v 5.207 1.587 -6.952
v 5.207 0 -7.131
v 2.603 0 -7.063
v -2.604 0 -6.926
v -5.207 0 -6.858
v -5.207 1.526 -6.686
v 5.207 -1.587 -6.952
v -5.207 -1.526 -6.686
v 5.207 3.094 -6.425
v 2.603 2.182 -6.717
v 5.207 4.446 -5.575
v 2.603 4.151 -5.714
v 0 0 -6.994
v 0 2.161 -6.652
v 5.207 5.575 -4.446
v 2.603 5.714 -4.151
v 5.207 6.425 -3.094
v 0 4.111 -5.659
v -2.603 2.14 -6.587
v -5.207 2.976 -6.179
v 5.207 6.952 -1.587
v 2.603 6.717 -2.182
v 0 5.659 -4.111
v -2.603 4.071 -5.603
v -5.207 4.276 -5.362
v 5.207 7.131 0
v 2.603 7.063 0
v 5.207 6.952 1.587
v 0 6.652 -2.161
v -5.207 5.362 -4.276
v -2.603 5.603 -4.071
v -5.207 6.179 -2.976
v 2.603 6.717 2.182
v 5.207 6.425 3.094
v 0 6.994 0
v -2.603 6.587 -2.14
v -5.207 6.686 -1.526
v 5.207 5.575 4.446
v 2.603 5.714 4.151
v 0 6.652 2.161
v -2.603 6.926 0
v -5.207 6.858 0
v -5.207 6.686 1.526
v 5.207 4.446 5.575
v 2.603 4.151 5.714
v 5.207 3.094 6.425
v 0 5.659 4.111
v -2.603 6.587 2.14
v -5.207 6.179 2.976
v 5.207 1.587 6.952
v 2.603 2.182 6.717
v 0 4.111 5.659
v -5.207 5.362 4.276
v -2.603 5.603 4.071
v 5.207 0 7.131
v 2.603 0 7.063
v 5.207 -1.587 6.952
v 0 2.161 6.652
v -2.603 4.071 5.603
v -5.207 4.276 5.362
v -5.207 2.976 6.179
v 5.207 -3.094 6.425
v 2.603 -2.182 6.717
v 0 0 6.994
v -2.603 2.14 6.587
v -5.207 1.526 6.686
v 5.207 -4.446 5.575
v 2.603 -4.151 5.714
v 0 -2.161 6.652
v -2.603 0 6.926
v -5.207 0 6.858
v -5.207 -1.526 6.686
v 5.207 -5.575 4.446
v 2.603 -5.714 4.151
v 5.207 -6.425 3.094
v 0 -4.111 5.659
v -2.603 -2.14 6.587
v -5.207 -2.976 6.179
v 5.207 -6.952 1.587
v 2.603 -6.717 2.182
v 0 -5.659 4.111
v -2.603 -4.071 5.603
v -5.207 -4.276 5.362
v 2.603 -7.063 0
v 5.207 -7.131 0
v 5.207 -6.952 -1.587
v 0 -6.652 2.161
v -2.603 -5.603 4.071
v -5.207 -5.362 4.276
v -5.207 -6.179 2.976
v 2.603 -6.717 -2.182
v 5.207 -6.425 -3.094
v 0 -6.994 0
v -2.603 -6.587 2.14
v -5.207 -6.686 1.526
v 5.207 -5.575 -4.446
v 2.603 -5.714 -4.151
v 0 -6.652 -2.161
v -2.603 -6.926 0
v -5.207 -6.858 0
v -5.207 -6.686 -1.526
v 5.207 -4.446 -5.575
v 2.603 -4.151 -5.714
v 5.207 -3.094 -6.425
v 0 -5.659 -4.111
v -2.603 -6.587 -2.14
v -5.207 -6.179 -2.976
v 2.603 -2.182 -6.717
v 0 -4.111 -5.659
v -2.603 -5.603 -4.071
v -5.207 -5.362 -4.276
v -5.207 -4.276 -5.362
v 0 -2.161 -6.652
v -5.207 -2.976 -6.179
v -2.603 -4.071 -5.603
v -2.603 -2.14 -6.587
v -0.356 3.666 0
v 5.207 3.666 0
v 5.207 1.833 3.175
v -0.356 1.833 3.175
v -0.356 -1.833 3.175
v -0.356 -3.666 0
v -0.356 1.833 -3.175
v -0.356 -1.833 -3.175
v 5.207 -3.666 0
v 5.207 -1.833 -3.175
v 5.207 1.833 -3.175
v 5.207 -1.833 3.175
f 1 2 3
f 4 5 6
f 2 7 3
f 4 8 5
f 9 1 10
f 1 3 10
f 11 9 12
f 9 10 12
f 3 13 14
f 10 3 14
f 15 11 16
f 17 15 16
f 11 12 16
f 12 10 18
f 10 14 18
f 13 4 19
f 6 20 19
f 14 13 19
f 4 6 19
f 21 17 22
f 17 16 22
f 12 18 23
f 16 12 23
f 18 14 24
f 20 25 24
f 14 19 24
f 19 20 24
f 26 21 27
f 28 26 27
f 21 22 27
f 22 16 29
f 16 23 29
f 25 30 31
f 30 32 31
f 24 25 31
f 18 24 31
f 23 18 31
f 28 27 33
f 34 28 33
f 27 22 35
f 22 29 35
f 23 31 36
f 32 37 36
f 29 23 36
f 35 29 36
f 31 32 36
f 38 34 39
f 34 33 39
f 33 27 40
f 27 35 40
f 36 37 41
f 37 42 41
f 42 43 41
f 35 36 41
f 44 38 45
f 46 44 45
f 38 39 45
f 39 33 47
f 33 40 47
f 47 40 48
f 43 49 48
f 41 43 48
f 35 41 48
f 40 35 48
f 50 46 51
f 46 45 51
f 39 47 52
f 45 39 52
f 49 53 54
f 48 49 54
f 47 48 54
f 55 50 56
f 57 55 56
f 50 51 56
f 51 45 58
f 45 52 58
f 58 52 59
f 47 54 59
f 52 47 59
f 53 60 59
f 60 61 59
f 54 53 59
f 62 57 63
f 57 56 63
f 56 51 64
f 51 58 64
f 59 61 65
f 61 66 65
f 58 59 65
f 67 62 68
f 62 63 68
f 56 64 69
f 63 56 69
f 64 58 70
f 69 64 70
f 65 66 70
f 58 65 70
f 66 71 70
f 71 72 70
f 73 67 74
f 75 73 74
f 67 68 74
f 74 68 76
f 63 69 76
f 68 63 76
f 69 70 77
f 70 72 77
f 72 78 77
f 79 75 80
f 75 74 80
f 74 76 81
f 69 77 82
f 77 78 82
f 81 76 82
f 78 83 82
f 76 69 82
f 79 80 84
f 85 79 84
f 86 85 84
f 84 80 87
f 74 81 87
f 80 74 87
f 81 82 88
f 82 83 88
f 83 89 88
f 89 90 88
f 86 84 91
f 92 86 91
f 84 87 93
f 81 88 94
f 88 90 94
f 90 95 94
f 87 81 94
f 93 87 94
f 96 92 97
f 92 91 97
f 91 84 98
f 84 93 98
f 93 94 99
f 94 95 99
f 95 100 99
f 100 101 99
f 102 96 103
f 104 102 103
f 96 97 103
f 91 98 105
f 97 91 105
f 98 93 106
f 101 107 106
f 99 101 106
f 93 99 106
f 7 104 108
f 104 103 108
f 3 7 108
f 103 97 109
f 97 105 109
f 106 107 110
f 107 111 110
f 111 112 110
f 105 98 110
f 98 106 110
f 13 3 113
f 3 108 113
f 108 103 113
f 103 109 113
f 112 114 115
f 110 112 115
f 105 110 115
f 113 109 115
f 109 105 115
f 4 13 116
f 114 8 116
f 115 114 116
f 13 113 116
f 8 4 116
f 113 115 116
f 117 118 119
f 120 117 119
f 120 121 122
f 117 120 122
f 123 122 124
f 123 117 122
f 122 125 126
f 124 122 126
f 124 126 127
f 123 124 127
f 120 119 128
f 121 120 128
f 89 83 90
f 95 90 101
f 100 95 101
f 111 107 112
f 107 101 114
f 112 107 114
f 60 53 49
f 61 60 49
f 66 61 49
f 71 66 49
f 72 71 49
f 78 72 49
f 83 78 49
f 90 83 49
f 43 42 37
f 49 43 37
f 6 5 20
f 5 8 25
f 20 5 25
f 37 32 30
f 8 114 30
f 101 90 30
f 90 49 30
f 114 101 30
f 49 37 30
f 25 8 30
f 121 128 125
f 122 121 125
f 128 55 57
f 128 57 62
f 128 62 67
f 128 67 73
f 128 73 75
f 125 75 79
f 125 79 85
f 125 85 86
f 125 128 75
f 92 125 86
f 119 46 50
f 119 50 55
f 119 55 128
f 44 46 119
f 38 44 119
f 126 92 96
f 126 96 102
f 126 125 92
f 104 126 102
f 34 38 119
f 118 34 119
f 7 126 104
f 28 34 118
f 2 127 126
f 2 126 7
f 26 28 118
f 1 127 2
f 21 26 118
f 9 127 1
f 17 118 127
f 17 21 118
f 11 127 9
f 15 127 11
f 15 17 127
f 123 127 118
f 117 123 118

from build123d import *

# Parameters (mm, degrees)
SKETCH2_R          = 6.858
EXTRUDE1_DEPTH     = 10.414
EXTRUDE1_DRAFT     = -1.5
CUT_EXTRUDE7_DEPTH = 5.5626


with BuildPart() as part:
    # Sketch2 → Extrude1 (with draft: the straight prism first)
    with BuildSketch(Plane(origin=(-5.207, 0, 0), x_dir=(0, 0, -1), z_dir=(1, 0, 0))):
        Circle(SKETCH2_R)
    extrude(amount=EXTRUDE1_DEPTH)
    # Extrude1: the draft: its side faces are tilted about the plane it starts from
    extrude1_sides = [part.faces().sort_by_distance(p)[0] for p in [
        (0, 0, 6.858),
    ]]
    draft(extrude1_sides, Plane(origin=(-5.207, 0, 0), x_dir=(0, 0, -1), z_dir=(1, 0, 0)), EXTRUDE1_DRAFT)

    # Sketch6 → Cut-Extrude7 (cut)
    with BuildSketch(Plane(origin=(5.207, 0, 0), x_dir=(0, 0, -1), z_dir=(1, 0, 0))):
        Polygon((0, 3.666174209), (-3.175, 1.833087105), (-3.175, -1.833087105), (0, -3.666174209), (3.175, -1.833087105), (3.175, 1.833087105), align=None)
    extrude(amount=-CUT_EXTRUDE7_DEPTH, mode=Mode.SUBTRACT)


solid = part.part
